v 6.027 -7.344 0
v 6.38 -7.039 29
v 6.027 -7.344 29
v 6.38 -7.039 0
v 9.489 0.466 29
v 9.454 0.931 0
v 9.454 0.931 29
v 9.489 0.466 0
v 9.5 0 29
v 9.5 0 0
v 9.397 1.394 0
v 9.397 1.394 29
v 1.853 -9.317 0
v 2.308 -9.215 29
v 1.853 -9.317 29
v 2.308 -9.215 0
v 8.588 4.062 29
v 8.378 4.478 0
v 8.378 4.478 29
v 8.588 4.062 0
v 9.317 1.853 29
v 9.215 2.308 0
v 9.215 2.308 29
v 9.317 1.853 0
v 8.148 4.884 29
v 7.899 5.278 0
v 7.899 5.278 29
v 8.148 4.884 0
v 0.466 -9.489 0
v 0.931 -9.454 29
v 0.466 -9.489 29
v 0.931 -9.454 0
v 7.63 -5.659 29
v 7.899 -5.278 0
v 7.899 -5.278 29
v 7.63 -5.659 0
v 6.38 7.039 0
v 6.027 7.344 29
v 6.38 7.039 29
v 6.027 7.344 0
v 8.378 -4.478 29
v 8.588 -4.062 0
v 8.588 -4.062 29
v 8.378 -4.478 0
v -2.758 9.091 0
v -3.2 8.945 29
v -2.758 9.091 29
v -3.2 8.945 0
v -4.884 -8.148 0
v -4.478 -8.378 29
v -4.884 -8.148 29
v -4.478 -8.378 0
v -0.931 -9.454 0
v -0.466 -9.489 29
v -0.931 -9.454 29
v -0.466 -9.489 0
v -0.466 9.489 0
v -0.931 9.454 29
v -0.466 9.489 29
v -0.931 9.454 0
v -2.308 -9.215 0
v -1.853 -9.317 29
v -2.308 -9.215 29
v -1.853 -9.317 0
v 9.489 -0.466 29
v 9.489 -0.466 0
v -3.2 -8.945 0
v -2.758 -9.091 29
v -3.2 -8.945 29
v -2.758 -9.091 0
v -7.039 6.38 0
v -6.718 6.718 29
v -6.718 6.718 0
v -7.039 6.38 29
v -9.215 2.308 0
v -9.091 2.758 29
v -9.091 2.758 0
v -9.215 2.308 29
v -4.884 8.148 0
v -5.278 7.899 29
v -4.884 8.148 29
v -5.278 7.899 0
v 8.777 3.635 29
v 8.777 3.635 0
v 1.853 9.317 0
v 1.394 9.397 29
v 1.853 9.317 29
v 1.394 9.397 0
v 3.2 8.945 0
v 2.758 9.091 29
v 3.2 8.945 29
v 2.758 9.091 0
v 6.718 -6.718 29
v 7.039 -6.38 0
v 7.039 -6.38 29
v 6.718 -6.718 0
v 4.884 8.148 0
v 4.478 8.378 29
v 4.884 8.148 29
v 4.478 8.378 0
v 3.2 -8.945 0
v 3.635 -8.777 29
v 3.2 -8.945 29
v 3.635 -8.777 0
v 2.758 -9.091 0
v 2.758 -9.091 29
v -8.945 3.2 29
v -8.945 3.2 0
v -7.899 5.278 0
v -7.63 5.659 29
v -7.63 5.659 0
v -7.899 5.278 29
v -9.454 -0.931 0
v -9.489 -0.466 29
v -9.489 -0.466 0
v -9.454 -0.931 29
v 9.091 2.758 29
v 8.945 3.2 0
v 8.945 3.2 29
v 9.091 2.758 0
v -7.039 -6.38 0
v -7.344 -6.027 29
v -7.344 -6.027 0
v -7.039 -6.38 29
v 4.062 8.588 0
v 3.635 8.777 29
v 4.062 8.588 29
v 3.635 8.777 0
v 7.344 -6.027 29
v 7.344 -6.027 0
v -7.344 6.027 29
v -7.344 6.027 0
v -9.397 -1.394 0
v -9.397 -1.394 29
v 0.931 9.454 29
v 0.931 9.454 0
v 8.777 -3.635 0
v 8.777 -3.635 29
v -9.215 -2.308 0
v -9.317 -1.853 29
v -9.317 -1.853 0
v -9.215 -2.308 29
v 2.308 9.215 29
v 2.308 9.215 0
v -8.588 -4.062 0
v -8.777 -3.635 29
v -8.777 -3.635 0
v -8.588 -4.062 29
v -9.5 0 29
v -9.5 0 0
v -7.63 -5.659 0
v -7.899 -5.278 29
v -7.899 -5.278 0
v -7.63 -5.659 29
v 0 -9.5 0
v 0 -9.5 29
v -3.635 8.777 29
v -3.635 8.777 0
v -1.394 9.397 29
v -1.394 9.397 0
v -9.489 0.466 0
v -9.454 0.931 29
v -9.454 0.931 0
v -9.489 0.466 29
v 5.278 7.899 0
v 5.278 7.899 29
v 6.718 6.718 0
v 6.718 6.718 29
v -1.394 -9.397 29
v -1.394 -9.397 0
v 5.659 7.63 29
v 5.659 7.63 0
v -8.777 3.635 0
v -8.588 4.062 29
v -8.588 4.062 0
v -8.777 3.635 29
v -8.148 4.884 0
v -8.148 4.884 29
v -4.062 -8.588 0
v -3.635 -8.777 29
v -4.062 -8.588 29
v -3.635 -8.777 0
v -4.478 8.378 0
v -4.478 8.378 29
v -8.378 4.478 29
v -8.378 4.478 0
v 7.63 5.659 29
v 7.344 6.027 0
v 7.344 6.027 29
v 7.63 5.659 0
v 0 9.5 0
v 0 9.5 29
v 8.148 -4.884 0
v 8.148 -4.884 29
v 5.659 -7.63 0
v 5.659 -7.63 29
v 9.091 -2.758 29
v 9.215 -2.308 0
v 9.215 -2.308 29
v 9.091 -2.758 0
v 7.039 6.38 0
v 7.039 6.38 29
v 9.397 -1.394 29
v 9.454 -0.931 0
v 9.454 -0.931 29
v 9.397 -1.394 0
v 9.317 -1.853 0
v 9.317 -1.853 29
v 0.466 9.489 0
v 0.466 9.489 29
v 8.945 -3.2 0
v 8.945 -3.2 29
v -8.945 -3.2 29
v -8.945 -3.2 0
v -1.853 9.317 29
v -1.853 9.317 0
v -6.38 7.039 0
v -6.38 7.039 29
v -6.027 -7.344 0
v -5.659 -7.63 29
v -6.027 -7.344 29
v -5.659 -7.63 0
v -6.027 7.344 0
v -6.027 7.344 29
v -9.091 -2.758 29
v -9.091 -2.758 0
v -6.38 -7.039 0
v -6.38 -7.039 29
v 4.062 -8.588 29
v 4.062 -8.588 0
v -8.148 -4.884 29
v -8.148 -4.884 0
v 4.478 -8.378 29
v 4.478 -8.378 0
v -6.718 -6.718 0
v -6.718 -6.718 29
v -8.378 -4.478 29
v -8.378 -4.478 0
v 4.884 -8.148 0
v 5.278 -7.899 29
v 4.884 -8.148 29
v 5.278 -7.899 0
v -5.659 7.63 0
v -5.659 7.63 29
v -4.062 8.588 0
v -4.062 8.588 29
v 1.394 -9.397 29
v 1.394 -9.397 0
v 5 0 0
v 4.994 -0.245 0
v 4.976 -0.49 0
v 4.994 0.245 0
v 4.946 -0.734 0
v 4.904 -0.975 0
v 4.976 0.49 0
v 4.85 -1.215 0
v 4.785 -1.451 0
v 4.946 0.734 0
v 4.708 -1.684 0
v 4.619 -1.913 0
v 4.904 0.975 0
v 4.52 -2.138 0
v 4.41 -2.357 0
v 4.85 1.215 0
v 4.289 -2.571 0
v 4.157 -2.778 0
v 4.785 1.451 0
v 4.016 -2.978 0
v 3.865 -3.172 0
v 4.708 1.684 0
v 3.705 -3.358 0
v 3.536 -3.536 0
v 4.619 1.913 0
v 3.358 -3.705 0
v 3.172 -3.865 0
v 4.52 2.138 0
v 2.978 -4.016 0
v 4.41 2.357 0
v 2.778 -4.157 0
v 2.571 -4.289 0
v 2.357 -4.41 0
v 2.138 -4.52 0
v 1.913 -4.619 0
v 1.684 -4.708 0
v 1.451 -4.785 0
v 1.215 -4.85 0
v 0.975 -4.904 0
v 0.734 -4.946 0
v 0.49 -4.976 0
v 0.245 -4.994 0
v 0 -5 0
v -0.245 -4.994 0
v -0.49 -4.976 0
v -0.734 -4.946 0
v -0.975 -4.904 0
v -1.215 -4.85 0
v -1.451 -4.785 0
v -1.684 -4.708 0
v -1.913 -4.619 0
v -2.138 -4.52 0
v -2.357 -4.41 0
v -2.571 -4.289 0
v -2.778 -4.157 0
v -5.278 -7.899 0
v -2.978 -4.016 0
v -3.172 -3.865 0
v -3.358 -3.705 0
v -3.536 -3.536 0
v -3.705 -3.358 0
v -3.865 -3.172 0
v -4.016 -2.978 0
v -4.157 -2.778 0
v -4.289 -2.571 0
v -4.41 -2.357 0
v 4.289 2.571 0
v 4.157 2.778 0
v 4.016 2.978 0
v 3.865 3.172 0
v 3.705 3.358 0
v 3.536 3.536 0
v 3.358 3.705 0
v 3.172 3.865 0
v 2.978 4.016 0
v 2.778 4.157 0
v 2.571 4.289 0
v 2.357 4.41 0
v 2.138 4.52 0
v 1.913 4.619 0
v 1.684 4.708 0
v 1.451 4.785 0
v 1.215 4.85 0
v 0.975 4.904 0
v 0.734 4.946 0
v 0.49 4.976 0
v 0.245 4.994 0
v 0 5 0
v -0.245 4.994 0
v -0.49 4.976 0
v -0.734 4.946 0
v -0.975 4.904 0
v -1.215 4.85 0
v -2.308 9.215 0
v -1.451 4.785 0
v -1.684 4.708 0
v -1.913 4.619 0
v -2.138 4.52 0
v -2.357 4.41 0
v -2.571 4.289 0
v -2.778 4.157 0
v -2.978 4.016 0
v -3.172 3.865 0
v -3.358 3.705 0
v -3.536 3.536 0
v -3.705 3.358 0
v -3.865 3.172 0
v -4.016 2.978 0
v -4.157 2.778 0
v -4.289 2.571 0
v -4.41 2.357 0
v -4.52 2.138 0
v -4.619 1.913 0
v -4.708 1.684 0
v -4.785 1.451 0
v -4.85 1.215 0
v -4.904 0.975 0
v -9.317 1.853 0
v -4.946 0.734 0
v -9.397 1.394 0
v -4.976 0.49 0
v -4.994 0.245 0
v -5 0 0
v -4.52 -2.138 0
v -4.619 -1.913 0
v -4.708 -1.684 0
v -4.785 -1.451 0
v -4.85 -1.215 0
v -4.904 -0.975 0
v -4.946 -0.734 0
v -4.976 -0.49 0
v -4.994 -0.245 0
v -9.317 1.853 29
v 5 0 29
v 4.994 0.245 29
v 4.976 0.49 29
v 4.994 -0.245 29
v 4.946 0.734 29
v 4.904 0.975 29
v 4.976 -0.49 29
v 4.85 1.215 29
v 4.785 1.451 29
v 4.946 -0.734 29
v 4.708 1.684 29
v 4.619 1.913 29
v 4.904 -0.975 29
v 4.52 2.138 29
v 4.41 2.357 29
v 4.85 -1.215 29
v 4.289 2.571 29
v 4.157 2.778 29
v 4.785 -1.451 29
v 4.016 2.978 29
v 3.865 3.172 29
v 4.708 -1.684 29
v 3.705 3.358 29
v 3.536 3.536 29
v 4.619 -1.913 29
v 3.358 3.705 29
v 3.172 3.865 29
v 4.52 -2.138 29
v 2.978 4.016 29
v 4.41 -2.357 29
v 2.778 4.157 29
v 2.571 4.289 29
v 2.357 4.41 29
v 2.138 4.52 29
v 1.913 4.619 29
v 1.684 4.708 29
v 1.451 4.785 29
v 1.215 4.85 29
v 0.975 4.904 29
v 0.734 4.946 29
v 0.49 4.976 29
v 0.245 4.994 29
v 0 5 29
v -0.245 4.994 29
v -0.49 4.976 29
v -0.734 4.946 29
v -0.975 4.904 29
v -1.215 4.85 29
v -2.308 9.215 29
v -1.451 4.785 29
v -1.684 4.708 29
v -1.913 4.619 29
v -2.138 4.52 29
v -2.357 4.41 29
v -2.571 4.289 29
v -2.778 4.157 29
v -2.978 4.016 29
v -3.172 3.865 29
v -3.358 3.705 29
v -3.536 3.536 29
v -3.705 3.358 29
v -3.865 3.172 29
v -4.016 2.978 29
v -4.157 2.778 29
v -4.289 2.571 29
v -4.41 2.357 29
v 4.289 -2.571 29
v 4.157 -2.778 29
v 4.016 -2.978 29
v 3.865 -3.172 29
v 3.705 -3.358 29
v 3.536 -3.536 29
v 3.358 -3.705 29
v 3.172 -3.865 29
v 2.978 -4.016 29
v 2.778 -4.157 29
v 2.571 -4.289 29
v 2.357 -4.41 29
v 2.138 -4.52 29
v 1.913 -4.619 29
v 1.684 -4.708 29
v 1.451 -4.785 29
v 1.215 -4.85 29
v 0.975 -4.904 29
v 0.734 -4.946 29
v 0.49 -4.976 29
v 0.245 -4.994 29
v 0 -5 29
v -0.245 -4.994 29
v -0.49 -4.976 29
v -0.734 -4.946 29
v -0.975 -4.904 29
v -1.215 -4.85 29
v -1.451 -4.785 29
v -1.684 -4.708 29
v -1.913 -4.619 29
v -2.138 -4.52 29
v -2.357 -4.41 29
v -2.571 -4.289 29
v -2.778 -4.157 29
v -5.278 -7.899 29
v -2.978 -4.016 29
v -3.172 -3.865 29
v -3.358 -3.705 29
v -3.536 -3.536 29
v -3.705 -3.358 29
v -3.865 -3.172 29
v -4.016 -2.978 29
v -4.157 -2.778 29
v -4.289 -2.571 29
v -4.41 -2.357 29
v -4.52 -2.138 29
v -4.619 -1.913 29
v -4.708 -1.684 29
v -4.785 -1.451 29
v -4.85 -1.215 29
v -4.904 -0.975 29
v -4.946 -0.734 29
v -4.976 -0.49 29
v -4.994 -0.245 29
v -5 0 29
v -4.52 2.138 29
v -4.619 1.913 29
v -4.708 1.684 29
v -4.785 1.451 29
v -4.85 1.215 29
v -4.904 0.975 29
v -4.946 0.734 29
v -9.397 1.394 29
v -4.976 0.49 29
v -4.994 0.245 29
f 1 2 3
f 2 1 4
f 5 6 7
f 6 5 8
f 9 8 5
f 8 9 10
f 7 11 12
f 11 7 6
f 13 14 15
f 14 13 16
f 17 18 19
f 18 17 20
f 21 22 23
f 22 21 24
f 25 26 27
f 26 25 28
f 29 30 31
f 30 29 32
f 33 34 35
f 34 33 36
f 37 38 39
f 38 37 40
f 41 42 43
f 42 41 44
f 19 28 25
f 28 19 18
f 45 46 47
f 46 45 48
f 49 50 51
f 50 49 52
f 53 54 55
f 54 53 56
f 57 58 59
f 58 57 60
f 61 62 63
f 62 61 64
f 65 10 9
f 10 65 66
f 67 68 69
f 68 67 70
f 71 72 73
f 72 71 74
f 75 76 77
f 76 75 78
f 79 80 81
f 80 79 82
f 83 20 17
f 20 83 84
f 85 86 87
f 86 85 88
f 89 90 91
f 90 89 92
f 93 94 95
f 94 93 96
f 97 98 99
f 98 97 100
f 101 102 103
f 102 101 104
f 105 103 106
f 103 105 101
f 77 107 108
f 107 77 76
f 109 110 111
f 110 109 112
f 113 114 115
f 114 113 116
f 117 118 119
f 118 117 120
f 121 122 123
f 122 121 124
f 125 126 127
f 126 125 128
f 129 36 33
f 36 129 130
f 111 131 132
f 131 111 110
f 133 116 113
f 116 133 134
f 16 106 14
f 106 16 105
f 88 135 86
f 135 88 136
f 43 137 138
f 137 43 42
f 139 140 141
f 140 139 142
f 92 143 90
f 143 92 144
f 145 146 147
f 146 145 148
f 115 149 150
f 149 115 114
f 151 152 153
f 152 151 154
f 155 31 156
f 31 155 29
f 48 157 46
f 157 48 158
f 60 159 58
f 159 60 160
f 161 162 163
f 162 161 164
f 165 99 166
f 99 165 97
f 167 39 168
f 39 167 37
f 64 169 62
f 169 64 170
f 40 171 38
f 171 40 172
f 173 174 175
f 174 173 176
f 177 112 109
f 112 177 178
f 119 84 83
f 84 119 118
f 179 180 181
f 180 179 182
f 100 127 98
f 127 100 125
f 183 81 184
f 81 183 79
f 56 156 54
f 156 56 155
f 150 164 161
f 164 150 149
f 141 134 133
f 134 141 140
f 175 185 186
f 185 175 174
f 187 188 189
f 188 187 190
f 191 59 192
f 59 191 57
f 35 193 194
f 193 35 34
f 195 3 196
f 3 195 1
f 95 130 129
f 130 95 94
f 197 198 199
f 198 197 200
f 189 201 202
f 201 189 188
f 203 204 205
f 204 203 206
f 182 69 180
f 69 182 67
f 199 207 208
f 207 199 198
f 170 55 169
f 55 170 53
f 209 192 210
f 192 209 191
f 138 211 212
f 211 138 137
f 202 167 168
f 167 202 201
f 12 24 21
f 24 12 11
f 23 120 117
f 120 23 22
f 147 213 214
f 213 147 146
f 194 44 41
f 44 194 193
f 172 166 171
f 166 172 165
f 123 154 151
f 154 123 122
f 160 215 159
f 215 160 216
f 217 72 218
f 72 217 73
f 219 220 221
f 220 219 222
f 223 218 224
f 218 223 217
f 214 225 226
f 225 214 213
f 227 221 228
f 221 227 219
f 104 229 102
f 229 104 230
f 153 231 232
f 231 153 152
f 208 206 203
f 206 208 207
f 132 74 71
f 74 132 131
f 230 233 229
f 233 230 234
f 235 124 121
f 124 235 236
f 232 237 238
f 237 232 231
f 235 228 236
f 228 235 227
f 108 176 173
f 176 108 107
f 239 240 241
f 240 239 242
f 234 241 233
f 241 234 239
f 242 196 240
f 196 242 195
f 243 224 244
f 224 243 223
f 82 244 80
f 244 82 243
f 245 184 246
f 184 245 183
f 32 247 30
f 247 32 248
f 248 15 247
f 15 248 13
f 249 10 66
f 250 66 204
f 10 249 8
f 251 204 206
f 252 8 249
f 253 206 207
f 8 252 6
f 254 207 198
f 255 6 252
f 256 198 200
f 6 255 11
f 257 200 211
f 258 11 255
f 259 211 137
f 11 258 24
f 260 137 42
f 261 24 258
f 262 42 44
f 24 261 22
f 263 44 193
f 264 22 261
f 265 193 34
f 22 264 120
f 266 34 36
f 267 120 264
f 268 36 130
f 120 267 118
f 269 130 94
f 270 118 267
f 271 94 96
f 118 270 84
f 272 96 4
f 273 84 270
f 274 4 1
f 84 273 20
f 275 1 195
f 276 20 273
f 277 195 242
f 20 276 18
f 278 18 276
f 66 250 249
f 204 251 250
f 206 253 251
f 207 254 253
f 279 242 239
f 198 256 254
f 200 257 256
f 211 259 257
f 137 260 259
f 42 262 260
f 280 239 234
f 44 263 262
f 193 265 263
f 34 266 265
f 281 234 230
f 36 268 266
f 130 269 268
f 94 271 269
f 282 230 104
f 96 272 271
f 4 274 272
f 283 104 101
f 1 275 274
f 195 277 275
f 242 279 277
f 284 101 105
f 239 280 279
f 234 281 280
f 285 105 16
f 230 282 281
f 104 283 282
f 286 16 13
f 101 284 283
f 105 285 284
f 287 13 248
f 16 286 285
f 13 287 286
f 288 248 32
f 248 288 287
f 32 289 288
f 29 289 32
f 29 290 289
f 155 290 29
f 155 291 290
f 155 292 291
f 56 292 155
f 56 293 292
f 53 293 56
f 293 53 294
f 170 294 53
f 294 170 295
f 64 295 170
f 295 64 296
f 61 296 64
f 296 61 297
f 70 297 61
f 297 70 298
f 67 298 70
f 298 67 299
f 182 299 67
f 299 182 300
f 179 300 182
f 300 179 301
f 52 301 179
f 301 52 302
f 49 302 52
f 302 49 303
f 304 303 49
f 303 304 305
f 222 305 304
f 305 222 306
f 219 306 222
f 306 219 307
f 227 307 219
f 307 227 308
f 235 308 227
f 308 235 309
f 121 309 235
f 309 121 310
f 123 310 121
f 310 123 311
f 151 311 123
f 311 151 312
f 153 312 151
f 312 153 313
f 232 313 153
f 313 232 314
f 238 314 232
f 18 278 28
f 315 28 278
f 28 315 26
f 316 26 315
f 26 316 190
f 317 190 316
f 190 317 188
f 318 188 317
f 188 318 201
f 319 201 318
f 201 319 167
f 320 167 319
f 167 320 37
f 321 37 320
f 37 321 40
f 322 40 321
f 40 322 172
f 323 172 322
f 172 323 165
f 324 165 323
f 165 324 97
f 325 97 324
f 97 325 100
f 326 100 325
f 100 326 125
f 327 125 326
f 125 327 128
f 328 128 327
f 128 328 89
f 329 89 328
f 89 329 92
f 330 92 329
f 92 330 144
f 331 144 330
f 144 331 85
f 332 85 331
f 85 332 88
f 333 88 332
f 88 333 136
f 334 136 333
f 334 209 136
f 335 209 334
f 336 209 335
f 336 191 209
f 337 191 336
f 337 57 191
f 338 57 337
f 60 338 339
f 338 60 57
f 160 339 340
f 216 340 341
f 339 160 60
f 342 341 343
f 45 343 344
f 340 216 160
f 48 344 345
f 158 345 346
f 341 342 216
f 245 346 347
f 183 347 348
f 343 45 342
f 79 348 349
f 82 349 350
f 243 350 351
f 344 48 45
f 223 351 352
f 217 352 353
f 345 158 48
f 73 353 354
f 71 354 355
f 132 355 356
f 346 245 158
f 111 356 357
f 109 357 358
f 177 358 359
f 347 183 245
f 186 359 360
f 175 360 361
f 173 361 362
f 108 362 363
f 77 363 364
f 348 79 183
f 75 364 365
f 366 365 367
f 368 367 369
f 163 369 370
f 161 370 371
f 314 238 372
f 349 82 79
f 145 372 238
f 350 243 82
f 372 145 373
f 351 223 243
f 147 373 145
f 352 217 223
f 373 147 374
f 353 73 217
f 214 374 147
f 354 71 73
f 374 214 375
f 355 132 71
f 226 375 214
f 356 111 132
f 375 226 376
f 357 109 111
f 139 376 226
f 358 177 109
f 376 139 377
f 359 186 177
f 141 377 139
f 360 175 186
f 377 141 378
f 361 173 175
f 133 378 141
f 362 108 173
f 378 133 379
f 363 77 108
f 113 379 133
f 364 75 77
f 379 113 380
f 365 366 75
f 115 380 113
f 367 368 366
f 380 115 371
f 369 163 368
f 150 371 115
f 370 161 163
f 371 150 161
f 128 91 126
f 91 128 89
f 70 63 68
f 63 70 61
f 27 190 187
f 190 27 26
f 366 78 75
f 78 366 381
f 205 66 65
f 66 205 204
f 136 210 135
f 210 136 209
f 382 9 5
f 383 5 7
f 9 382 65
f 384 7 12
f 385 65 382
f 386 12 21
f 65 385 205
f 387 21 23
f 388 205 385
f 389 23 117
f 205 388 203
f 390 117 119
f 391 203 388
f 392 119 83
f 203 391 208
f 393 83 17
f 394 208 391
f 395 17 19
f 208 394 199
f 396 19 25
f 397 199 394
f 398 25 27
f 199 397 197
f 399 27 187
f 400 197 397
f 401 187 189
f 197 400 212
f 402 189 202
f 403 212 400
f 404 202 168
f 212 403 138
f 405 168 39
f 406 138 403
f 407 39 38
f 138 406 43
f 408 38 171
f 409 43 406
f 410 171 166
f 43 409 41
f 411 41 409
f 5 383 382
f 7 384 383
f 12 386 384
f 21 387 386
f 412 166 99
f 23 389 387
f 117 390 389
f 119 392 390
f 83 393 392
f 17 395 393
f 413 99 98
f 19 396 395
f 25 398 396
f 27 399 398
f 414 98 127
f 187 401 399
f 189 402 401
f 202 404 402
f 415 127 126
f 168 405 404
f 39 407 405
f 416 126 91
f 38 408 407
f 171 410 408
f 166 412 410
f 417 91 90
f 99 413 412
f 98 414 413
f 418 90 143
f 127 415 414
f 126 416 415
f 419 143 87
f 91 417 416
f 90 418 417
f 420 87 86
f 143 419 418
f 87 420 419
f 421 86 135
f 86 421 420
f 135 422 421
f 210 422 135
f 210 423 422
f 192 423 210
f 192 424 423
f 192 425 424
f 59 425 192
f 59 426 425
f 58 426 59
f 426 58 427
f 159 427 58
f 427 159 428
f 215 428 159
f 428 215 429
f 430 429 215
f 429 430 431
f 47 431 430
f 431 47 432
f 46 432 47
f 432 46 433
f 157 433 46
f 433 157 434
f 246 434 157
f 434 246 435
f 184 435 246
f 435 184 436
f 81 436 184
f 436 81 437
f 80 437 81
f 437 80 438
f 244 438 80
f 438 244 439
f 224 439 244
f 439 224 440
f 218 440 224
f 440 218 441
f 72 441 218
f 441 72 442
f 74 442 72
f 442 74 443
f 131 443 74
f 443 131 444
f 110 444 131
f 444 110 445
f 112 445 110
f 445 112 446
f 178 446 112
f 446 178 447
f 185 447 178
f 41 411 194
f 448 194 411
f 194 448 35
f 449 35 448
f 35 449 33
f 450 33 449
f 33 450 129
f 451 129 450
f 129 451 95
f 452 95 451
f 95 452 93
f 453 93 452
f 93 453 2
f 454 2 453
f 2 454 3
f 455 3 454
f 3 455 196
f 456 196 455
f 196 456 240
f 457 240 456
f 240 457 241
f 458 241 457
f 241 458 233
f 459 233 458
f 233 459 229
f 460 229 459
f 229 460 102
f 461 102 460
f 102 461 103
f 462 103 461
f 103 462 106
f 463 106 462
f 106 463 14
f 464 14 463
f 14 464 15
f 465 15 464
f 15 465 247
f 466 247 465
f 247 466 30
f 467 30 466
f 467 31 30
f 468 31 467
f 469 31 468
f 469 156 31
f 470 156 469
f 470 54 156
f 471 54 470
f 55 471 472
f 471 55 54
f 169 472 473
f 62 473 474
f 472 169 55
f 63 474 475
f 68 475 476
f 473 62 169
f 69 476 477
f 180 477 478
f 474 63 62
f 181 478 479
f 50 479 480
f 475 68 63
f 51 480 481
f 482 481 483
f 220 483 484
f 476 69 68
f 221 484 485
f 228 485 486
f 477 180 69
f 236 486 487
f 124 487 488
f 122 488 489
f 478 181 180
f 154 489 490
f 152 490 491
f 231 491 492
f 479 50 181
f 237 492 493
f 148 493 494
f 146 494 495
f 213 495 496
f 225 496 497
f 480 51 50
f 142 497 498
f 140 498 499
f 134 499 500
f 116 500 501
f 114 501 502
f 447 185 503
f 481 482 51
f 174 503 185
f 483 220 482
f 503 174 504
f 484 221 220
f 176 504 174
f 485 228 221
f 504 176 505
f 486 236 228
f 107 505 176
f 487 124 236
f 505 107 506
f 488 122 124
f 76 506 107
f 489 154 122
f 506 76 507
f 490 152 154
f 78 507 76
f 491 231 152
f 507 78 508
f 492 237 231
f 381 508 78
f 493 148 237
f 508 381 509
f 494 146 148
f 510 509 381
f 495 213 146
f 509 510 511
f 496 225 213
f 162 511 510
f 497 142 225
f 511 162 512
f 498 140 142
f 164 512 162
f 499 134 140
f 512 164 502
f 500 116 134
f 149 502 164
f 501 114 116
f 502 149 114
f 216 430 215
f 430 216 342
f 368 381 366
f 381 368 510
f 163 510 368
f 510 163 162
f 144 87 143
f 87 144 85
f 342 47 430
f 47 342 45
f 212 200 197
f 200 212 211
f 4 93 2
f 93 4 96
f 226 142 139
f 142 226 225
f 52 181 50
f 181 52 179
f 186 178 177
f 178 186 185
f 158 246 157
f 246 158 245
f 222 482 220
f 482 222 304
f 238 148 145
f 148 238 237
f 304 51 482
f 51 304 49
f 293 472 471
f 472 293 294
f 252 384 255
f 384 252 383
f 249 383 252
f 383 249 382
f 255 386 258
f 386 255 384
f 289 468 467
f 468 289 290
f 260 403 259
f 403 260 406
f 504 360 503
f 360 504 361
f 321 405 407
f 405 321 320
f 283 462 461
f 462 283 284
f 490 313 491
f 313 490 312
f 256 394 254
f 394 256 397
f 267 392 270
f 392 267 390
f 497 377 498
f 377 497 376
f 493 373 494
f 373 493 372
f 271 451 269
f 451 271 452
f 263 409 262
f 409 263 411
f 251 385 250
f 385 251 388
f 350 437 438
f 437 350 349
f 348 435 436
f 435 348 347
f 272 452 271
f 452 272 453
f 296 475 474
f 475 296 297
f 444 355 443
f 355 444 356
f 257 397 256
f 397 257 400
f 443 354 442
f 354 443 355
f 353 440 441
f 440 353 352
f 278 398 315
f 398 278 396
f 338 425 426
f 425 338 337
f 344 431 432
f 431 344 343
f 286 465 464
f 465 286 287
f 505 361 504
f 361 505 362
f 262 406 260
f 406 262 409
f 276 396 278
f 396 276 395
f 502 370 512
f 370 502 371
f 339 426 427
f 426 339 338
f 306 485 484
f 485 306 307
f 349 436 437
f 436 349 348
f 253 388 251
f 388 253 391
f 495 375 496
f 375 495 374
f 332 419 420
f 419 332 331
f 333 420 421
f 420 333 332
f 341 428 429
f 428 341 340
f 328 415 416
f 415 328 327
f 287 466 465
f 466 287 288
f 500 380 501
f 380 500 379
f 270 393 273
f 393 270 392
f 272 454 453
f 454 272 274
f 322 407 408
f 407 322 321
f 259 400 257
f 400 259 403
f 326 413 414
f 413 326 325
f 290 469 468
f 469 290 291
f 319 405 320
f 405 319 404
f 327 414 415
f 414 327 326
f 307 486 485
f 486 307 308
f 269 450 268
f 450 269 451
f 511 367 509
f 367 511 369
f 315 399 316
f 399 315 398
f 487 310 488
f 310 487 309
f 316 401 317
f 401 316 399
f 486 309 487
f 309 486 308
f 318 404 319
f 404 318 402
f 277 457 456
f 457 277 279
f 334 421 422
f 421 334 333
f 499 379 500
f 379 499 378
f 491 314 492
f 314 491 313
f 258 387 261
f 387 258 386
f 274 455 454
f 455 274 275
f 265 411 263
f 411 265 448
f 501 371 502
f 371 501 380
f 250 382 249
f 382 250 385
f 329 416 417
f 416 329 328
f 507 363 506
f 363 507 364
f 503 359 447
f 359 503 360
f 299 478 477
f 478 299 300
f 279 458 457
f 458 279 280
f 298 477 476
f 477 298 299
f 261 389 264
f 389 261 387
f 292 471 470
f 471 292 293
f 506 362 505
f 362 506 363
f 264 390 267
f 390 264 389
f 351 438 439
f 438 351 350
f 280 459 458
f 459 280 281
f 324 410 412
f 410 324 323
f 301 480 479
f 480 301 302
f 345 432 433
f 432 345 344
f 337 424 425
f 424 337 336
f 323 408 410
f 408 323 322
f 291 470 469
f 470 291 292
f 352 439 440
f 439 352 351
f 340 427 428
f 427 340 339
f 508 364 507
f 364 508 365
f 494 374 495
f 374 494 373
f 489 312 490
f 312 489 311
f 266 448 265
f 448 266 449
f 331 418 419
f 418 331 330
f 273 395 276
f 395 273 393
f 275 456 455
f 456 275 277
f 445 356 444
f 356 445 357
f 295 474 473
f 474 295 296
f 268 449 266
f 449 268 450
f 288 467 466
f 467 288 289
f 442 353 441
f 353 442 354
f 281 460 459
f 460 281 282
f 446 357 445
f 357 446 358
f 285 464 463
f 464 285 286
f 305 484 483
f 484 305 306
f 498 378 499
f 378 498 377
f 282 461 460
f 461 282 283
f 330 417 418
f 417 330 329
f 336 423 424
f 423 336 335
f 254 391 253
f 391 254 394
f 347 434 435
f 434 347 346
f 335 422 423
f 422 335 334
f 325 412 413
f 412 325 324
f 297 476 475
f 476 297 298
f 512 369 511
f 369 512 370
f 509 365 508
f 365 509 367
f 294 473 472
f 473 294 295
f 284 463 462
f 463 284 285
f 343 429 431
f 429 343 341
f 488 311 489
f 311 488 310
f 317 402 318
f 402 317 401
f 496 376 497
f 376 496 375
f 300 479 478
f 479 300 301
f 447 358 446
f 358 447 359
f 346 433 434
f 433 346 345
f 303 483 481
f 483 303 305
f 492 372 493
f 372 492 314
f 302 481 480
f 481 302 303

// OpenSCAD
$fn = 128;

bore_d = 10.0;
outer_d = 19.0;
length = 29.0;

difference() {
  cylinder(d = outer_d, h = length, center = false);
  translate([0, 0, -0.1])
    cylinder(d = bore_d, h = length + 0.2, center = false);
}
